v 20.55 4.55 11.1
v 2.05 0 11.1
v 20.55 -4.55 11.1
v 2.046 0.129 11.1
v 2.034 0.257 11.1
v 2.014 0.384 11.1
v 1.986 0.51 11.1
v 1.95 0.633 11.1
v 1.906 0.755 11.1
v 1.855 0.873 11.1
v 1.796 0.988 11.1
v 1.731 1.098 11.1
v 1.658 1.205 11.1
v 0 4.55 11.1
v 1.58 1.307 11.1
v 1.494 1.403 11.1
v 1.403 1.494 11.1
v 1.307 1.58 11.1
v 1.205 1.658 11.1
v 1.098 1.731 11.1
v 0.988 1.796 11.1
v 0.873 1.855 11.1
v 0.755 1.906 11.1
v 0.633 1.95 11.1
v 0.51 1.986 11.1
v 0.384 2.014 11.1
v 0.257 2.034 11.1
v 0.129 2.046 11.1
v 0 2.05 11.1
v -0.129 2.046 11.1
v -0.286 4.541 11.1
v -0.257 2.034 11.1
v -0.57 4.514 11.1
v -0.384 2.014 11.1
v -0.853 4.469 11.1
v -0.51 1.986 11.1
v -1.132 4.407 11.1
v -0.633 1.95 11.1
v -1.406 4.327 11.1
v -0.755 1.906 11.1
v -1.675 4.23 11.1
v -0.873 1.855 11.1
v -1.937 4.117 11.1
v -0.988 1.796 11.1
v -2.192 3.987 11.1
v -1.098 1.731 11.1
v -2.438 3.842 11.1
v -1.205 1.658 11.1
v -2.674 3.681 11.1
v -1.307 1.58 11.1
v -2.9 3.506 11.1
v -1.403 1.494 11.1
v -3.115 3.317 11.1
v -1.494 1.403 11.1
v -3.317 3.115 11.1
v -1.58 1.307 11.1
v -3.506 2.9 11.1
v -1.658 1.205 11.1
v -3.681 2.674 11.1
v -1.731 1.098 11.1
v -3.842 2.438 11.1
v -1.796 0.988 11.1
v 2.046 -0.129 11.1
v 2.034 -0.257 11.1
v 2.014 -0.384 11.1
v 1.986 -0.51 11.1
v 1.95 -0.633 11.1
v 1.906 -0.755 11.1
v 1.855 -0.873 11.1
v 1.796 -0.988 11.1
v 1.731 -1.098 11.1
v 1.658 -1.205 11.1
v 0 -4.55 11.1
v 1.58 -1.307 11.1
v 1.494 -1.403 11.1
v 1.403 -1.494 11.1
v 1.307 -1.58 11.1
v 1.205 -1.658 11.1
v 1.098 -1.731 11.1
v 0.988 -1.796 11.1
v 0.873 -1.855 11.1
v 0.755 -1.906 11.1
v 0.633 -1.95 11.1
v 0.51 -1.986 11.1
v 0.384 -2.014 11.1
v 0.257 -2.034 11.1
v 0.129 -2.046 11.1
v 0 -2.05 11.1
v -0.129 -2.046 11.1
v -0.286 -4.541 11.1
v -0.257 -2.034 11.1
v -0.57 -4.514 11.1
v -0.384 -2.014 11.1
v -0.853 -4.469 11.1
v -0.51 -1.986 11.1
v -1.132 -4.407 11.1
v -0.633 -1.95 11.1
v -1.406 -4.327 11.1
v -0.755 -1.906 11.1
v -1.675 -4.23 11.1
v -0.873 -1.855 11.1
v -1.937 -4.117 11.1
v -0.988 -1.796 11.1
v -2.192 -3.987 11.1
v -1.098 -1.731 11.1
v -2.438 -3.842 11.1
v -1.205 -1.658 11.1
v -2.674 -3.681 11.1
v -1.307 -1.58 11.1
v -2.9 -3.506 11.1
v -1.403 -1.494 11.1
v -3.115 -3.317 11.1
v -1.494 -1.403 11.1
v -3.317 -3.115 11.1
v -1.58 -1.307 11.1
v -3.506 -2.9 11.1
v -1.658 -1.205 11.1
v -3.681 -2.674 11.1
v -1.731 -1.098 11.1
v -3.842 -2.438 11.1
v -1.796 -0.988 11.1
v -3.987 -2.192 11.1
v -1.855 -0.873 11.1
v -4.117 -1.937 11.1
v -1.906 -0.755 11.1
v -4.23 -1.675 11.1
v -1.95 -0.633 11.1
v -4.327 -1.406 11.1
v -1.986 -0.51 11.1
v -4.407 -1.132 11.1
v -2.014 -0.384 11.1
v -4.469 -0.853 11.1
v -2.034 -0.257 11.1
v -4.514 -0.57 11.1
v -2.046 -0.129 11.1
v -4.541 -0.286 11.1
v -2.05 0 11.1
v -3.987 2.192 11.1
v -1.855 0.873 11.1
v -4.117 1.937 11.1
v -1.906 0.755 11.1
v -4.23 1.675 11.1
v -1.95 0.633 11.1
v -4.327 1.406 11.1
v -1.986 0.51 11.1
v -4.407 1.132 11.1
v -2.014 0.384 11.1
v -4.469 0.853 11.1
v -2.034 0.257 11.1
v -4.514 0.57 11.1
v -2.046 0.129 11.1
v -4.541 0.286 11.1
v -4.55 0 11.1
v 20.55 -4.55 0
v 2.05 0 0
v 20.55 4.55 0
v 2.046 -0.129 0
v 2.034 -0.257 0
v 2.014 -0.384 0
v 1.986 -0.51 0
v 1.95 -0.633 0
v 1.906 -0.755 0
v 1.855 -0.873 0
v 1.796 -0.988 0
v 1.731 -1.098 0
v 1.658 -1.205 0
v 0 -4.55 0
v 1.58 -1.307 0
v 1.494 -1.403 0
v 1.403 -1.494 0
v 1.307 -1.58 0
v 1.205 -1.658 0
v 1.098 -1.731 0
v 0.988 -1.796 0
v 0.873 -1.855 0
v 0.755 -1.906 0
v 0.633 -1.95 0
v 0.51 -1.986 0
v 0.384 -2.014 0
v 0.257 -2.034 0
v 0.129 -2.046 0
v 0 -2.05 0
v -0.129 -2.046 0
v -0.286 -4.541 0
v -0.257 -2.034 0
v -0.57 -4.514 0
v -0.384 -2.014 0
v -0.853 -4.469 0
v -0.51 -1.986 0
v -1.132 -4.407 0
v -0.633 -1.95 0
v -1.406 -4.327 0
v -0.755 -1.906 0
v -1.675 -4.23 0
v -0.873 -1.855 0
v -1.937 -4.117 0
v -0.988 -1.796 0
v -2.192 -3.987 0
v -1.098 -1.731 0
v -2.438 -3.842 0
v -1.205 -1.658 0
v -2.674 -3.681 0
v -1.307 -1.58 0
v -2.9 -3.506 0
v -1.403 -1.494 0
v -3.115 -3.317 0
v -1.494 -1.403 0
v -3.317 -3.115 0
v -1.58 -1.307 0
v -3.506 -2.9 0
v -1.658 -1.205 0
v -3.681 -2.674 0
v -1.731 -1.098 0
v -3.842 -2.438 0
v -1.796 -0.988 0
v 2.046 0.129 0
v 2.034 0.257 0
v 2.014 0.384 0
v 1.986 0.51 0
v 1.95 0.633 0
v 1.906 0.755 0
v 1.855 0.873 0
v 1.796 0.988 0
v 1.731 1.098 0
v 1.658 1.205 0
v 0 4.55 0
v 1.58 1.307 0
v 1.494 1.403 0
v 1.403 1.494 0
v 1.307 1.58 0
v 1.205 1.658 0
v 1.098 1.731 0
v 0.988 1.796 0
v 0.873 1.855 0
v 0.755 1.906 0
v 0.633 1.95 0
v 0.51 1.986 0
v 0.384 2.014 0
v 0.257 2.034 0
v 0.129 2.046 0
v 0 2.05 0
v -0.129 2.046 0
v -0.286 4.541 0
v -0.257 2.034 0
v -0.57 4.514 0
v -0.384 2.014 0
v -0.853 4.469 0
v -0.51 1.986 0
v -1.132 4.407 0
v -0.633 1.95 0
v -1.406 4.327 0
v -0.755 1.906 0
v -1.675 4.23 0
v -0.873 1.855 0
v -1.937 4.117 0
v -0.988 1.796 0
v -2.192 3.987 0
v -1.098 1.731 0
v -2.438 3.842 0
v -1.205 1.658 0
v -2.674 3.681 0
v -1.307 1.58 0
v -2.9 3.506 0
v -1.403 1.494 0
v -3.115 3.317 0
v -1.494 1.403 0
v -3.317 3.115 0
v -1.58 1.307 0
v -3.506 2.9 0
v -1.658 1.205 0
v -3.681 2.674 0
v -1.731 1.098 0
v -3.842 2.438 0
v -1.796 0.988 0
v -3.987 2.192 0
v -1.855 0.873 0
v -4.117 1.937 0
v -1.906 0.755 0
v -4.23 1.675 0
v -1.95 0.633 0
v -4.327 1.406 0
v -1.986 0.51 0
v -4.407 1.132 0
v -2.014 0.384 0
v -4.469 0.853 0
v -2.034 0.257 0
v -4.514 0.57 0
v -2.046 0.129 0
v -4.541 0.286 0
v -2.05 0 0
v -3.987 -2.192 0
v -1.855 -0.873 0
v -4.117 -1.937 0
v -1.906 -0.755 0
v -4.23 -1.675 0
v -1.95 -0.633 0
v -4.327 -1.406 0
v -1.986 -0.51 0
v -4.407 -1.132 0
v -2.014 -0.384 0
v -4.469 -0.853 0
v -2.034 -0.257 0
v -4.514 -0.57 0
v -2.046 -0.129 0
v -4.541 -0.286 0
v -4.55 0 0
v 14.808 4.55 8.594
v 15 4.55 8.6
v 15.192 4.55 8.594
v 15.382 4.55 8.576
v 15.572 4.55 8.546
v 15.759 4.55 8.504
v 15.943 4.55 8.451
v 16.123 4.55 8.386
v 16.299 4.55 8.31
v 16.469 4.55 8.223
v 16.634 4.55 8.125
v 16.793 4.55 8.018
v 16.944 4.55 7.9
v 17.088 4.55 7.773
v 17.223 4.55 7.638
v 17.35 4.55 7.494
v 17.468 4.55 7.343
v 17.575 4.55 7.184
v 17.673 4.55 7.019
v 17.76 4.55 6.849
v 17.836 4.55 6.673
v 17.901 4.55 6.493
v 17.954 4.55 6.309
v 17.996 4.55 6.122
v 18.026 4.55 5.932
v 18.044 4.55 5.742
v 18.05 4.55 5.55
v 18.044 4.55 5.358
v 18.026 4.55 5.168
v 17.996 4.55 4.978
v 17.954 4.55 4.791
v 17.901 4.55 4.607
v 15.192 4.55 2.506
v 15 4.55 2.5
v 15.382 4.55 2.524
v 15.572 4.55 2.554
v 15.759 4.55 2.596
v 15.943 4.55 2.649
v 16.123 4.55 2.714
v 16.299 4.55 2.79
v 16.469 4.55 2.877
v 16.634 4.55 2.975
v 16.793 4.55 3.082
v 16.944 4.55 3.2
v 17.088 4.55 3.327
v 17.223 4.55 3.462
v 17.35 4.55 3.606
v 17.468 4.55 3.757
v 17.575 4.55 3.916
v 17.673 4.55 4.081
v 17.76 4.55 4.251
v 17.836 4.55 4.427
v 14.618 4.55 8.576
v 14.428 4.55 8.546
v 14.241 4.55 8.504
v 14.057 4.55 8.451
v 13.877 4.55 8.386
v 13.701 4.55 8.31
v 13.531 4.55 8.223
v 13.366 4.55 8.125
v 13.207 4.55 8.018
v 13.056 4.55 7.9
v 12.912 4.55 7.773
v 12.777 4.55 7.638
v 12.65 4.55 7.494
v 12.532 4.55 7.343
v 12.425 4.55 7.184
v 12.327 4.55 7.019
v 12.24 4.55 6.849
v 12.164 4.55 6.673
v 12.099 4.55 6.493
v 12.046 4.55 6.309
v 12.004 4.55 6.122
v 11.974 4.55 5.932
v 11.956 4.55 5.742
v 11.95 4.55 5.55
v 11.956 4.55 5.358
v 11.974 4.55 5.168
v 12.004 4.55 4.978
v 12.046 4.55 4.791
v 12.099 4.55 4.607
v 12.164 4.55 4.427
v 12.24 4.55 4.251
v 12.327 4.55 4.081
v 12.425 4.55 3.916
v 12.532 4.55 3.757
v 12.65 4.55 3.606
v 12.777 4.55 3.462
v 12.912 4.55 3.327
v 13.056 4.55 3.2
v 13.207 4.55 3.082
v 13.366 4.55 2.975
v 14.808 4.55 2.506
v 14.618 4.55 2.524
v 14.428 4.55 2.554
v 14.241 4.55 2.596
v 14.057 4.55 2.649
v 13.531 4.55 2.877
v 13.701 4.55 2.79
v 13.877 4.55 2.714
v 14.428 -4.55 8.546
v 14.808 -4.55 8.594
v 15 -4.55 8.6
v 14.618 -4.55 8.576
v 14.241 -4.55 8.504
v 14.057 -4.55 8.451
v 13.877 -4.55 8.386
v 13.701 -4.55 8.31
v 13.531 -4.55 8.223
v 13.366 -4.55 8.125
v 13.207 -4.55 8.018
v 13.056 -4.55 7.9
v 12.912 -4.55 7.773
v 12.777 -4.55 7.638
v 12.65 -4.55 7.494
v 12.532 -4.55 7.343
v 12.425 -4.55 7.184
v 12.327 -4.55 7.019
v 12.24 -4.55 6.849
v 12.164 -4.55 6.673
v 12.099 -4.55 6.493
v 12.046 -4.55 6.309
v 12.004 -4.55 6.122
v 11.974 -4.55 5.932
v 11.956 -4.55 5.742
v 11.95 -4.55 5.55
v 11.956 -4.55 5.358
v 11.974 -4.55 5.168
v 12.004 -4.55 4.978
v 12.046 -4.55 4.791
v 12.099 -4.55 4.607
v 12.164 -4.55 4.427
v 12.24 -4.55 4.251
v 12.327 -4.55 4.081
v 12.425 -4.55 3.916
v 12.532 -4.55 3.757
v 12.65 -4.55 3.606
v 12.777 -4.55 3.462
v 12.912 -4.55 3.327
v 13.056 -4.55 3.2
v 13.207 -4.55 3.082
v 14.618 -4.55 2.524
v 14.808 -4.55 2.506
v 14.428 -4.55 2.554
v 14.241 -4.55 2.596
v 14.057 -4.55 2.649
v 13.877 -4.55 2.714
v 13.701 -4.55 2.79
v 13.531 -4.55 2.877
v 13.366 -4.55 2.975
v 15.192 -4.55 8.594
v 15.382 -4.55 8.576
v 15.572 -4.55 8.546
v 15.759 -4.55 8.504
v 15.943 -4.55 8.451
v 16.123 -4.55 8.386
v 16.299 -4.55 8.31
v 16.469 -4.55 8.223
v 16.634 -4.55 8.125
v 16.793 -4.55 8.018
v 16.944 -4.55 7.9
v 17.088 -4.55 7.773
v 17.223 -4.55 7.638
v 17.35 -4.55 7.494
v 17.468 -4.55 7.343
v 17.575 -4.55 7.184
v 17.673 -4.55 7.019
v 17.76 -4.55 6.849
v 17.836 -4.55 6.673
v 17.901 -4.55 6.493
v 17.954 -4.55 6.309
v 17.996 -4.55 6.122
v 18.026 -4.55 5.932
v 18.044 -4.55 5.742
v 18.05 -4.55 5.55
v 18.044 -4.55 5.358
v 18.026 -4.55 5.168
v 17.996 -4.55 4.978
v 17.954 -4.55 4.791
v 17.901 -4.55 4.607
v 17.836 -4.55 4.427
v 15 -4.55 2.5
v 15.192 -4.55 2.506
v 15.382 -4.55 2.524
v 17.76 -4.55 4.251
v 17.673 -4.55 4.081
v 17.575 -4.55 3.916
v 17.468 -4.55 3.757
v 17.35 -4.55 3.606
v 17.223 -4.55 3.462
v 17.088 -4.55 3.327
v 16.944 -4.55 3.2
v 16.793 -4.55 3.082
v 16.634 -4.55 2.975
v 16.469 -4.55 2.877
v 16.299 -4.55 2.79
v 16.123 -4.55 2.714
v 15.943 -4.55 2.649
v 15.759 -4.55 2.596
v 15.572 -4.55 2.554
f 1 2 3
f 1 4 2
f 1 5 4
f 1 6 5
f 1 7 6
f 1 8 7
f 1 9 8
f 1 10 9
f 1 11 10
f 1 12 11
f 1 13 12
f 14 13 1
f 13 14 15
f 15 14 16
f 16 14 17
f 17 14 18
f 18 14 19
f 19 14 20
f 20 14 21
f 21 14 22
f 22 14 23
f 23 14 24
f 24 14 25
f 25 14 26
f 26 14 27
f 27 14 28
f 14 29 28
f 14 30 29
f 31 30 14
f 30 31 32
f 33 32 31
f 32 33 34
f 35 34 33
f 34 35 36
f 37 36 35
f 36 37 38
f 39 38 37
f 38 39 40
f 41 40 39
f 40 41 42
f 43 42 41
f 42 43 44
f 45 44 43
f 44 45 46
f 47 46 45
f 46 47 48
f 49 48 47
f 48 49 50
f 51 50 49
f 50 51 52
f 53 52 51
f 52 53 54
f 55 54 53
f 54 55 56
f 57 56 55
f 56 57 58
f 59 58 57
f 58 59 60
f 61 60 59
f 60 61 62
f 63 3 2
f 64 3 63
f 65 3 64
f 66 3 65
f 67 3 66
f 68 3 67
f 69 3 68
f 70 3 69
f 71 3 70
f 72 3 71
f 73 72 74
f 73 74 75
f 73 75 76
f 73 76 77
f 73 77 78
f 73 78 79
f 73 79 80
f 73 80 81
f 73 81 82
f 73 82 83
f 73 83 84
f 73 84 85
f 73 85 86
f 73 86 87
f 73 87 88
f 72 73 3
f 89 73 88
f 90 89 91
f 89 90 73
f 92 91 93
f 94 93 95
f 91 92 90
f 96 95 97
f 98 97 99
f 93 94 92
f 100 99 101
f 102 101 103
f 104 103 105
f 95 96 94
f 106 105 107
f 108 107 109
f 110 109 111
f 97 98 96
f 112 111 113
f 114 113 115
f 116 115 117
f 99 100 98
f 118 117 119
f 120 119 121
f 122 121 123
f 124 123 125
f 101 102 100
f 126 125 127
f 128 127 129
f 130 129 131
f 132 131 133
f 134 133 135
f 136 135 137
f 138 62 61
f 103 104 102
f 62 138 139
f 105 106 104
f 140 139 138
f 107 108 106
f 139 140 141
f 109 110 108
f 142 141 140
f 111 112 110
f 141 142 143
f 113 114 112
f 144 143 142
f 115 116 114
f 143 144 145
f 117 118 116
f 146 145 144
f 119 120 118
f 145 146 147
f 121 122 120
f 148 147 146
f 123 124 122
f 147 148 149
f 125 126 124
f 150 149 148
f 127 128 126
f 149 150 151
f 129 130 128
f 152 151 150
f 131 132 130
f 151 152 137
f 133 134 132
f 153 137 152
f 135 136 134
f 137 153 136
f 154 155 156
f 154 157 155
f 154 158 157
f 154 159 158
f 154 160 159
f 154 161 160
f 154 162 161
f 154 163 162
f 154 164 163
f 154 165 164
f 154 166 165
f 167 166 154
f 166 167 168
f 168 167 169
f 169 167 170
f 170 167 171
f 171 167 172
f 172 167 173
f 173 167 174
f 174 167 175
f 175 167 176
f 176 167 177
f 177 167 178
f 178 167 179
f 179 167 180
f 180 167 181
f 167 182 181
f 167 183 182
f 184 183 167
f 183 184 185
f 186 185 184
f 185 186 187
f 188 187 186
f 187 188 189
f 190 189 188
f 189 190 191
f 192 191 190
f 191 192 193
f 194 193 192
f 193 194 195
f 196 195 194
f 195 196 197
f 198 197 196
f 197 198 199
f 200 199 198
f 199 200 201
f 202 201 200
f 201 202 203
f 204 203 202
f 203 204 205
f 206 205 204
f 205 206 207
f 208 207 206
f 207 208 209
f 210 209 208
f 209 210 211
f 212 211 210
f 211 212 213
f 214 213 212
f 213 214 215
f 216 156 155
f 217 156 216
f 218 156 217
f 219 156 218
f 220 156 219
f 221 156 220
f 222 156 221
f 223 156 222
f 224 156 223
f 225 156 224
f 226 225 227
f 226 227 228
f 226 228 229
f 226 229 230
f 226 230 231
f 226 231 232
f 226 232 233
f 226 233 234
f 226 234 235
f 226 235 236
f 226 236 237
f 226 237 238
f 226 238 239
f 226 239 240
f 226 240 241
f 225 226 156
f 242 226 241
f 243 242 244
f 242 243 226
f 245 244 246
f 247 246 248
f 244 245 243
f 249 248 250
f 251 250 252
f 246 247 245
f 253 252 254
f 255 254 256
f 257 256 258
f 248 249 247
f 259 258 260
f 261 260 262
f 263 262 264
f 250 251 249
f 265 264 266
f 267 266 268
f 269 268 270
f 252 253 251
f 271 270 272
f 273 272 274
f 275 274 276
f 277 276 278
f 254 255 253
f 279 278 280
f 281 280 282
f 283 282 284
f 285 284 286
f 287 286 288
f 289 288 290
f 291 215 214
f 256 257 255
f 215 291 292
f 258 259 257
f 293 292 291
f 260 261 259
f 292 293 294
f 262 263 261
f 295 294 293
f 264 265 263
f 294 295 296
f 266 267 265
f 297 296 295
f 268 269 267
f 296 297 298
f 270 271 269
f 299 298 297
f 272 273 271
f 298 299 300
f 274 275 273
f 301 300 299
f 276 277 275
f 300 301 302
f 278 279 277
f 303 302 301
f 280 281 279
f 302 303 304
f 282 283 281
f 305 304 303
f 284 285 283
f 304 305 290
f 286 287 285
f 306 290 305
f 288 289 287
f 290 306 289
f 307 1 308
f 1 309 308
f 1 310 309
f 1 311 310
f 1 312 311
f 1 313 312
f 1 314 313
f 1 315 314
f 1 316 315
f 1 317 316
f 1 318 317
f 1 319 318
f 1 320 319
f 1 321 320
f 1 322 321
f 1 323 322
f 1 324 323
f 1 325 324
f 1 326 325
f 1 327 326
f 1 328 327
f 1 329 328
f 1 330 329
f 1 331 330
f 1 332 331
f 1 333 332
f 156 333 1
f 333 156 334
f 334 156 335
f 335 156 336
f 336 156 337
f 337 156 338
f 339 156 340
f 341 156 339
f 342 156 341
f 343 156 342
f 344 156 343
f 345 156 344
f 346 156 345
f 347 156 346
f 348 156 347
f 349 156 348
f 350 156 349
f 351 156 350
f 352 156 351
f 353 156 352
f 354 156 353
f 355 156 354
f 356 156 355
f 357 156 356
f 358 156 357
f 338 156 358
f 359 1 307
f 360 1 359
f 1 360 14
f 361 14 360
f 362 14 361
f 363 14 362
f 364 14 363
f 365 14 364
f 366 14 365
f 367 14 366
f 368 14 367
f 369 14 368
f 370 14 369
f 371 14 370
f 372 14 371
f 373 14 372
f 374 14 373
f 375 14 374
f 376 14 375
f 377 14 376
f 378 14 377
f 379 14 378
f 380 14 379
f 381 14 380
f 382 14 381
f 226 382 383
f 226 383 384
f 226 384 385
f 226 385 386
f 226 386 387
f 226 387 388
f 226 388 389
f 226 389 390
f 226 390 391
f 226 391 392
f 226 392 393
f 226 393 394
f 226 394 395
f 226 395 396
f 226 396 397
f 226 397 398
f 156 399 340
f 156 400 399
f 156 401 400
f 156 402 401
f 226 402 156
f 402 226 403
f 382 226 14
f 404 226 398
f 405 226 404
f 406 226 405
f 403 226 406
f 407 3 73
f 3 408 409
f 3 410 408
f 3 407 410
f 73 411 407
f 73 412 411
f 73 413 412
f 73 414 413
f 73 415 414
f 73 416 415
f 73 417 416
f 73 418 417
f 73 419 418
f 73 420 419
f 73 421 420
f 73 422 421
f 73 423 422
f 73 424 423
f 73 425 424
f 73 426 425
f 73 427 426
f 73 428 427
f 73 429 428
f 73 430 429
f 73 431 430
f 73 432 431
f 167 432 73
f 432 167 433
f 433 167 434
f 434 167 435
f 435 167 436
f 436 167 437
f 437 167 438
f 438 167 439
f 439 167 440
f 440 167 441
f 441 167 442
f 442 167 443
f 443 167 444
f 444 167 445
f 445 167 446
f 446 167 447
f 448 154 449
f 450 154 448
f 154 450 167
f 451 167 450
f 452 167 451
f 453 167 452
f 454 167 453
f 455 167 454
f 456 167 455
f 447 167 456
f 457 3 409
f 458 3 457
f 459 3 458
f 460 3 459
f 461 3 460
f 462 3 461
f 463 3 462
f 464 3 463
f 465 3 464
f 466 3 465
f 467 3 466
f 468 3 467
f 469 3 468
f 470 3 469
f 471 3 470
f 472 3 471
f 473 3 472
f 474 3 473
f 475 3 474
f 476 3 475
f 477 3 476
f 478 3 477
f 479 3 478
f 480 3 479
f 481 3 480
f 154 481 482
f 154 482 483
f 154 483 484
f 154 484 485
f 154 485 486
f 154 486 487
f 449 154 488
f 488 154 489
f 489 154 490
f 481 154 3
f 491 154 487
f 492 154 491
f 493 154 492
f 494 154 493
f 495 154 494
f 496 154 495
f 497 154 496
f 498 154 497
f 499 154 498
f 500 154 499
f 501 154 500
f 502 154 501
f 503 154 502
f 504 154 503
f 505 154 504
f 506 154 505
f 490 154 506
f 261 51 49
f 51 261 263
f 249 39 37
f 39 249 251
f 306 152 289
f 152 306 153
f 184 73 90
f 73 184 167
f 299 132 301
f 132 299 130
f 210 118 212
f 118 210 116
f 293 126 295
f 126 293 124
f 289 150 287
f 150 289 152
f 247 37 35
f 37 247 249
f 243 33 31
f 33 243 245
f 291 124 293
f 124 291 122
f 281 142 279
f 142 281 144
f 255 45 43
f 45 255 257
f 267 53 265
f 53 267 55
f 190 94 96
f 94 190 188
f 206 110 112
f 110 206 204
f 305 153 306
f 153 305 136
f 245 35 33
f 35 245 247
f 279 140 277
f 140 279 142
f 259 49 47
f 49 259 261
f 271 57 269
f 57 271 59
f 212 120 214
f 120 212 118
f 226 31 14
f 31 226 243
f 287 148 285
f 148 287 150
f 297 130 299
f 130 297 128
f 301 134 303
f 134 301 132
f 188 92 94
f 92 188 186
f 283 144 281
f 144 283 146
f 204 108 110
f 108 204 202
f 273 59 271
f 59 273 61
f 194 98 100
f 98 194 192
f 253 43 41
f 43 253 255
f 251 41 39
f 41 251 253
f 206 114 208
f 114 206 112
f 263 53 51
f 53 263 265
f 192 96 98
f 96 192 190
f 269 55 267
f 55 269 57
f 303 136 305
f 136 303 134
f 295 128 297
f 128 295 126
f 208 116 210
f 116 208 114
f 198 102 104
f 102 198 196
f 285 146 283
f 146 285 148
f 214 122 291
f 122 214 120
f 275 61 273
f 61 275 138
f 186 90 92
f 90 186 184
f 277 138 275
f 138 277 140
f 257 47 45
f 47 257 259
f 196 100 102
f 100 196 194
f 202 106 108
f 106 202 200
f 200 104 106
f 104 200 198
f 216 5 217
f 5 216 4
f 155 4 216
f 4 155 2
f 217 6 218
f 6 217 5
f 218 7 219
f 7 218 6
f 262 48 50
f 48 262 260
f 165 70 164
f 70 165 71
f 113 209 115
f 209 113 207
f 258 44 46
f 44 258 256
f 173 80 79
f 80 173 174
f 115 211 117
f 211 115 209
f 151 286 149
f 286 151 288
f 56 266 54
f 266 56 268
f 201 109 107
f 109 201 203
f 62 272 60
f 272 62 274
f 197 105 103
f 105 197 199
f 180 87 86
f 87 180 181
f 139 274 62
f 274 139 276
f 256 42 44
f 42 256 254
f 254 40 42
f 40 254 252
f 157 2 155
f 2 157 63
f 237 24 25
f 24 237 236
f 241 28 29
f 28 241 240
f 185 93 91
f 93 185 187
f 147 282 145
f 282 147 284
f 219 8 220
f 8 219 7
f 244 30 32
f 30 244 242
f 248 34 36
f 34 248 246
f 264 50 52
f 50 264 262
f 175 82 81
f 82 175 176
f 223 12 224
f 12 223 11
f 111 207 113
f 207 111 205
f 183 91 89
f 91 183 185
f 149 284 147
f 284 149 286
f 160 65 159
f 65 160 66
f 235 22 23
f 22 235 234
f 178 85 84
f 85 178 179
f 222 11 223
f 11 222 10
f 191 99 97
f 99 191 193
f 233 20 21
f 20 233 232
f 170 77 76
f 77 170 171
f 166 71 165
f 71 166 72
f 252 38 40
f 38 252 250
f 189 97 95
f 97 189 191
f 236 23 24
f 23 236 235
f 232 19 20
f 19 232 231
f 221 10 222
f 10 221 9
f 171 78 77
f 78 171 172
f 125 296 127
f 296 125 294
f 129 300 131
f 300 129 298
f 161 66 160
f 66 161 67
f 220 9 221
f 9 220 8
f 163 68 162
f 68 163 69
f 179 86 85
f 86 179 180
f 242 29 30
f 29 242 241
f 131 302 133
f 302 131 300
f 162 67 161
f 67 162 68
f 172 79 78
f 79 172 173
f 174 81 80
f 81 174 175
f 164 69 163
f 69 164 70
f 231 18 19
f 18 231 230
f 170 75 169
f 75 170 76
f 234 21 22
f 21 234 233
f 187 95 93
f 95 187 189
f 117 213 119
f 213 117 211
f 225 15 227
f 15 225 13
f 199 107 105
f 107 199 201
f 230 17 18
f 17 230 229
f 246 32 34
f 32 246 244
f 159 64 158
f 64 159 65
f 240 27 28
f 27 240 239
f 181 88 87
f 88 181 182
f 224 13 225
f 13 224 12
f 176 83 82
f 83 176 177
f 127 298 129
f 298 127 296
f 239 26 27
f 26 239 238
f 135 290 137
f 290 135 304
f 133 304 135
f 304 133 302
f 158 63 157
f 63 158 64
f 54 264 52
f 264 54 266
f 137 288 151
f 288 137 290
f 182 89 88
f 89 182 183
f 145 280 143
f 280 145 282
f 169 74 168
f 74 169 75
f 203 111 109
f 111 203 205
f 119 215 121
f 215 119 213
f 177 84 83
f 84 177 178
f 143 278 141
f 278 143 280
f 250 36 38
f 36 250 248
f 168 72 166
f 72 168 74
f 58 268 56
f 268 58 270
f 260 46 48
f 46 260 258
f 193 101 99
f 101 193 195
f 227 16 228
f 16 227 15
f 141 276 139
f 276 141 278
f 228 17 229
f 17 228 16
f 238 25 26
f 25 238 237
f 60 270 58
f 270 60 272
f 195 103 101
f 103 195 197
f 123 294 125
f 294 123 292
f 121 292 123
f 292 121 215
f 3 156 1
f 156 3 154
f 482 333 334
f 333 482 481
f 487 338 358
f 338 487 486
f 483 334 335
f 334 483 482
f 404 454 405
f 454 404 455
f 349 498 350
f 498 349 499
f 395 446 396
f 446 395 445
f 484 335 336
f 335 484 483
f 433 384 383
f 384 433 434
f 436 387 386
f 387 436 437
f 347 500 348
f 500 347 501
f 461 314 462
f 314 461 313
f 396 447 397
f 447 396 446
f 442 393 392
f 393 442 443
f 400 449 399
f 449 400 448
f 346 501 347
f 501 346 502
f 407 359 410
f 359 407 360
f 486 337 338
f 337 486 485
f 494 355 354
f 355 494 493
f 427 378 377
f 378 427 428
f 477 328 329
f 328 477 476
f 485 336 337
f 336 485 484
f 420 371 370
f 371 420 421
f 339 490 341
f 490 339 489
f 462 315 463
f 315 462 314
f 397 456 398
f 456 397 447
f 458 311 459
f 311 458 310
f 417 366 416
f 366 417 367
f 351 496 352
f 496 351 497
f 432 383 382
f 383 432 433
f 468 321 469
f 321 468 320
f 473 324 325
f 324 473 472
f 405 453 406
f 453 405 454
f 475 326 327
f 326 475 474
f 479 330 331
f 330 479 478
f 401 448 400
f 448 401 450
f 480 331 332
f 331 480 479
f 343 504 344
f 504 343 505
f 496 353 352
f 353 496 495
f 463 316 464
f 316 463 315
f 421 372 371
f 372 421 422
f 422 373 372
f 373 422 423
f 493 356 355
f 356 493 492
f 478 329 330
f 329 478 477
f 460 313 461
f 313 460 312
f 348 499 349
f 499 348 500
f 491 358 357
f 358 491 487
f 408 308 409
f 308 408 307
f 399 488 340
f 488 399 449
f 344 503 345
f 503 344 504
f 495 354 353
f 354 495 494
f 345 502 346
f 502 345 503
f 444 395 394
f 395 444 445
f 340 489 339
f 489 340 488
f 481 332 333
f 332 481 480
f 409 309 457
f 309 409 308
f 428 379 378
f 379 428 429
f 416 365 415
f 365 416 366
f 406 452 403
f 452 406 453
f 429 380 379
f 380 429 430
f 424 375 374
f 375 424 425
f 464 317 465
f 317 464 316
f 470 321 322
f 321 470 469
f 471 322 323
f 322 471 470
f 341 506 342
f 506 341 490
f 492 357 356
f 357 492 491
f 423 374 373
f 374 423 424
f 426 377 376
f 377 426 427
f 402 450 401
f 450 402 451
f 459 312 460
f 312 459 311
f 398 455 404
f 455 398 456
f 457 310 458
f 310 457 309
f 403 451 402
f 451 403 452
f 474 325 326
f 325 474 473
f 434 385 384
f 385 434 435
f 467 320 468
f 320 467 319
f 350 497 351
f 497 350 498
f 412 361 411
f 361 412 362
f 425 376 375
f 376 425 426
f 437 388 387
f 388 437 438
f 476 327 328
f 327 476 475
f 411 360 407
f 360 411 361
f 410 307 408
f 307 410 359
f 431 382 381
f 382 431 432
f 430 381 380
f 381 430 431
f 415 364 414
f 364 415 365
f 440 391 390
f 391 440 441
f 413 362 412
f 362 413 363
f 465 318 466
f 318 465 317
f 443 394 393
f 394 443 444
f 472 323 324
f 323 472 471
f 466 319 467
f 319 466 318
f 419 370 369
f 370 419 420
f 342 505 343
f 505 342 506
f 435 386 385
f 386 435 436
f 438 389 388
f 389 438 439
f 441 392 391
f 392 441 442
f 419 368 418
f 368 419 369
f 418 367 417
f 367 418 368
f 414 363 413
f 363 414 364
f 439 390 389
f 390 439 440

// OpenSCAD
/* [Global] */
//Select type of joint
type = 1; // [1:Type 1, 2:Type 2]
// select your machine's tolerance
tolerance = 0.1;
//minimum material around rods
walls = 2.5;
//diameter of vertical rod
rod_1_diameter = 4;
//shape of rod 1
shape_1 = 0; // [0:Round, 1:Square]
//diameter of horizontal rod
rod_2_diameter = 6;

/* [Type 1] */
//shape of rod 2
shape_2 = 1; // [0:Round, 1:Square]
//enable or disable minimum distance between rods (min = walls + rod_1_radius + rod_2_radius + tolerance)
minimum_distance = 0; // [0:False, 1:True]
//distance between rods, applicable if you disable minimum distance
rods_distance = 15;

/* [Type 2] */
//rod 2 length inside plastic
rod_2_length = 10;
//put 0 to disable nut
nut_thickness = 2.5;
//put 0 to disable nut and increase distance between rods using nut thickness parameter 
nut_length = 8;

/* [Hidden] */
$fn=100;
rod_1_d = rod_1_diameter + tolerance;
rod_2_d = rod_2_diameter + tolerance;
rod_1_height = rod_2_d + walls*2;
rod_2_height = rod_1_d + walls*2;
nut_thick = nut_thickness + tolerance;
nut_len = nut_length +tolerance;

if (type == 1){
	if (((rods_distance < (walls + (rod_1_d+rod_2_d)/2)) || (minimum_distance == 1 ))){
		rod1(rod_2_height);
		rod2((walls + (rod_1_d+rod_2_d)/2));
	}
	else{
		rod1(rod_2_height);
		rod2(rods_distance);
	}
}

if (type == 2){
	if (rod_2_height < nut_len + walls*2){
		rod1(nut_len + walls*2);
		rod2(rods_distance, nut_len + walls*2);
	}
	else{
		rod1(rod_2_height);
		rod2(rods_distance,rod_2_height);
	}
}

module rod1(cyl_1_d){
	if (type == 1){
		difference(){
			union(){
				translate([0,-(rod_2_height)/2,0])cube([rod_1_d/2+walls,rod_2_height,rod_1_height]);
				cylinder(d=rod_2_height,h=rod_1_height);
				if (shape_1 == 1){translate([-(rod_1_d/2+walls),-(rod_2_height)/2,0])cube([rod_2_height/2,rod_2_height,rod_1_height]);}
			}
			translate([0,0,-100])cylinder(d=rod_1_d,h=rod_1_height+200);
		}
	}
	else{
		difference(){
			union(){
				translate([0,-(cyl_1_d)/2,0])cube([cyl_1_d/2,cyl_1_d,rod_1_height]);
				cylinder(d=cyl_1_d,h=rod_1_height);
				if (shape_1 == 1){translate([-cyl_1_d/2,-cyl_1_d/2,0])cube([cyl_1_d/2,cyl_1_d,rod_1_height]);}
			}
			translate([0,0,-100])cylinder(d=rod_1_d,h=rod_1_height+200);
		}
	}
}

module rod2 (rods_dist, cyl_1_d){
	if (type == 1){
		echo("minimum rods distance", (walls + (rod_1_d+rod_2_d)/2));
		echo("rods distance:", rods_dist);
		difference(){
			union(){
				translate([rod_1_d/2,-rod_2_height/2,0])cube([rods_dist-rod_1_d/2,rod_2_height,rod_1_height]);
				translate([rods_dist,-rod_2_height/2,rod_1_height/2])rotate([270,0,0])cylinder(d=rod_2_d+walls*2,h=rod_2_height);
				if (shape_2 == 1){translate([rods_dist,-rod_2_height/2,0])cube([rod_1_height/2,rod_2_height,rod_1_height]);}
			}
			translate([rods_dist,-rod_2_height/2-100,rod_1_height/2])rotate([270,0,0])cylinder(d=rod_2_d,h=rod_2_height+200);
		}
	}
	else{
		difference(){
			translate([cyl_1_d/2,-cyl_1_d/2,0])cube([nut_thick,cyl_1_d,rod_1_height]);
			translate([cyl_1_d/2,-nut_len/2,-1])cube([nut_thick+1,nut_len,rod_1_height+2]);
		}
		difference(){
			translate([cyl_1_d/2+nut_thick,-cyl_1_d/2,0])cube([rod_2_length,cyl_1_d,rod_1_height]);
			translate([cyl_1_d/2+nut_thick-1,0,rod_1_height/2])rotate([0,90,0])cylinder(d=rod_2_d, h=rod_2_length+2);
		}
	}
}
